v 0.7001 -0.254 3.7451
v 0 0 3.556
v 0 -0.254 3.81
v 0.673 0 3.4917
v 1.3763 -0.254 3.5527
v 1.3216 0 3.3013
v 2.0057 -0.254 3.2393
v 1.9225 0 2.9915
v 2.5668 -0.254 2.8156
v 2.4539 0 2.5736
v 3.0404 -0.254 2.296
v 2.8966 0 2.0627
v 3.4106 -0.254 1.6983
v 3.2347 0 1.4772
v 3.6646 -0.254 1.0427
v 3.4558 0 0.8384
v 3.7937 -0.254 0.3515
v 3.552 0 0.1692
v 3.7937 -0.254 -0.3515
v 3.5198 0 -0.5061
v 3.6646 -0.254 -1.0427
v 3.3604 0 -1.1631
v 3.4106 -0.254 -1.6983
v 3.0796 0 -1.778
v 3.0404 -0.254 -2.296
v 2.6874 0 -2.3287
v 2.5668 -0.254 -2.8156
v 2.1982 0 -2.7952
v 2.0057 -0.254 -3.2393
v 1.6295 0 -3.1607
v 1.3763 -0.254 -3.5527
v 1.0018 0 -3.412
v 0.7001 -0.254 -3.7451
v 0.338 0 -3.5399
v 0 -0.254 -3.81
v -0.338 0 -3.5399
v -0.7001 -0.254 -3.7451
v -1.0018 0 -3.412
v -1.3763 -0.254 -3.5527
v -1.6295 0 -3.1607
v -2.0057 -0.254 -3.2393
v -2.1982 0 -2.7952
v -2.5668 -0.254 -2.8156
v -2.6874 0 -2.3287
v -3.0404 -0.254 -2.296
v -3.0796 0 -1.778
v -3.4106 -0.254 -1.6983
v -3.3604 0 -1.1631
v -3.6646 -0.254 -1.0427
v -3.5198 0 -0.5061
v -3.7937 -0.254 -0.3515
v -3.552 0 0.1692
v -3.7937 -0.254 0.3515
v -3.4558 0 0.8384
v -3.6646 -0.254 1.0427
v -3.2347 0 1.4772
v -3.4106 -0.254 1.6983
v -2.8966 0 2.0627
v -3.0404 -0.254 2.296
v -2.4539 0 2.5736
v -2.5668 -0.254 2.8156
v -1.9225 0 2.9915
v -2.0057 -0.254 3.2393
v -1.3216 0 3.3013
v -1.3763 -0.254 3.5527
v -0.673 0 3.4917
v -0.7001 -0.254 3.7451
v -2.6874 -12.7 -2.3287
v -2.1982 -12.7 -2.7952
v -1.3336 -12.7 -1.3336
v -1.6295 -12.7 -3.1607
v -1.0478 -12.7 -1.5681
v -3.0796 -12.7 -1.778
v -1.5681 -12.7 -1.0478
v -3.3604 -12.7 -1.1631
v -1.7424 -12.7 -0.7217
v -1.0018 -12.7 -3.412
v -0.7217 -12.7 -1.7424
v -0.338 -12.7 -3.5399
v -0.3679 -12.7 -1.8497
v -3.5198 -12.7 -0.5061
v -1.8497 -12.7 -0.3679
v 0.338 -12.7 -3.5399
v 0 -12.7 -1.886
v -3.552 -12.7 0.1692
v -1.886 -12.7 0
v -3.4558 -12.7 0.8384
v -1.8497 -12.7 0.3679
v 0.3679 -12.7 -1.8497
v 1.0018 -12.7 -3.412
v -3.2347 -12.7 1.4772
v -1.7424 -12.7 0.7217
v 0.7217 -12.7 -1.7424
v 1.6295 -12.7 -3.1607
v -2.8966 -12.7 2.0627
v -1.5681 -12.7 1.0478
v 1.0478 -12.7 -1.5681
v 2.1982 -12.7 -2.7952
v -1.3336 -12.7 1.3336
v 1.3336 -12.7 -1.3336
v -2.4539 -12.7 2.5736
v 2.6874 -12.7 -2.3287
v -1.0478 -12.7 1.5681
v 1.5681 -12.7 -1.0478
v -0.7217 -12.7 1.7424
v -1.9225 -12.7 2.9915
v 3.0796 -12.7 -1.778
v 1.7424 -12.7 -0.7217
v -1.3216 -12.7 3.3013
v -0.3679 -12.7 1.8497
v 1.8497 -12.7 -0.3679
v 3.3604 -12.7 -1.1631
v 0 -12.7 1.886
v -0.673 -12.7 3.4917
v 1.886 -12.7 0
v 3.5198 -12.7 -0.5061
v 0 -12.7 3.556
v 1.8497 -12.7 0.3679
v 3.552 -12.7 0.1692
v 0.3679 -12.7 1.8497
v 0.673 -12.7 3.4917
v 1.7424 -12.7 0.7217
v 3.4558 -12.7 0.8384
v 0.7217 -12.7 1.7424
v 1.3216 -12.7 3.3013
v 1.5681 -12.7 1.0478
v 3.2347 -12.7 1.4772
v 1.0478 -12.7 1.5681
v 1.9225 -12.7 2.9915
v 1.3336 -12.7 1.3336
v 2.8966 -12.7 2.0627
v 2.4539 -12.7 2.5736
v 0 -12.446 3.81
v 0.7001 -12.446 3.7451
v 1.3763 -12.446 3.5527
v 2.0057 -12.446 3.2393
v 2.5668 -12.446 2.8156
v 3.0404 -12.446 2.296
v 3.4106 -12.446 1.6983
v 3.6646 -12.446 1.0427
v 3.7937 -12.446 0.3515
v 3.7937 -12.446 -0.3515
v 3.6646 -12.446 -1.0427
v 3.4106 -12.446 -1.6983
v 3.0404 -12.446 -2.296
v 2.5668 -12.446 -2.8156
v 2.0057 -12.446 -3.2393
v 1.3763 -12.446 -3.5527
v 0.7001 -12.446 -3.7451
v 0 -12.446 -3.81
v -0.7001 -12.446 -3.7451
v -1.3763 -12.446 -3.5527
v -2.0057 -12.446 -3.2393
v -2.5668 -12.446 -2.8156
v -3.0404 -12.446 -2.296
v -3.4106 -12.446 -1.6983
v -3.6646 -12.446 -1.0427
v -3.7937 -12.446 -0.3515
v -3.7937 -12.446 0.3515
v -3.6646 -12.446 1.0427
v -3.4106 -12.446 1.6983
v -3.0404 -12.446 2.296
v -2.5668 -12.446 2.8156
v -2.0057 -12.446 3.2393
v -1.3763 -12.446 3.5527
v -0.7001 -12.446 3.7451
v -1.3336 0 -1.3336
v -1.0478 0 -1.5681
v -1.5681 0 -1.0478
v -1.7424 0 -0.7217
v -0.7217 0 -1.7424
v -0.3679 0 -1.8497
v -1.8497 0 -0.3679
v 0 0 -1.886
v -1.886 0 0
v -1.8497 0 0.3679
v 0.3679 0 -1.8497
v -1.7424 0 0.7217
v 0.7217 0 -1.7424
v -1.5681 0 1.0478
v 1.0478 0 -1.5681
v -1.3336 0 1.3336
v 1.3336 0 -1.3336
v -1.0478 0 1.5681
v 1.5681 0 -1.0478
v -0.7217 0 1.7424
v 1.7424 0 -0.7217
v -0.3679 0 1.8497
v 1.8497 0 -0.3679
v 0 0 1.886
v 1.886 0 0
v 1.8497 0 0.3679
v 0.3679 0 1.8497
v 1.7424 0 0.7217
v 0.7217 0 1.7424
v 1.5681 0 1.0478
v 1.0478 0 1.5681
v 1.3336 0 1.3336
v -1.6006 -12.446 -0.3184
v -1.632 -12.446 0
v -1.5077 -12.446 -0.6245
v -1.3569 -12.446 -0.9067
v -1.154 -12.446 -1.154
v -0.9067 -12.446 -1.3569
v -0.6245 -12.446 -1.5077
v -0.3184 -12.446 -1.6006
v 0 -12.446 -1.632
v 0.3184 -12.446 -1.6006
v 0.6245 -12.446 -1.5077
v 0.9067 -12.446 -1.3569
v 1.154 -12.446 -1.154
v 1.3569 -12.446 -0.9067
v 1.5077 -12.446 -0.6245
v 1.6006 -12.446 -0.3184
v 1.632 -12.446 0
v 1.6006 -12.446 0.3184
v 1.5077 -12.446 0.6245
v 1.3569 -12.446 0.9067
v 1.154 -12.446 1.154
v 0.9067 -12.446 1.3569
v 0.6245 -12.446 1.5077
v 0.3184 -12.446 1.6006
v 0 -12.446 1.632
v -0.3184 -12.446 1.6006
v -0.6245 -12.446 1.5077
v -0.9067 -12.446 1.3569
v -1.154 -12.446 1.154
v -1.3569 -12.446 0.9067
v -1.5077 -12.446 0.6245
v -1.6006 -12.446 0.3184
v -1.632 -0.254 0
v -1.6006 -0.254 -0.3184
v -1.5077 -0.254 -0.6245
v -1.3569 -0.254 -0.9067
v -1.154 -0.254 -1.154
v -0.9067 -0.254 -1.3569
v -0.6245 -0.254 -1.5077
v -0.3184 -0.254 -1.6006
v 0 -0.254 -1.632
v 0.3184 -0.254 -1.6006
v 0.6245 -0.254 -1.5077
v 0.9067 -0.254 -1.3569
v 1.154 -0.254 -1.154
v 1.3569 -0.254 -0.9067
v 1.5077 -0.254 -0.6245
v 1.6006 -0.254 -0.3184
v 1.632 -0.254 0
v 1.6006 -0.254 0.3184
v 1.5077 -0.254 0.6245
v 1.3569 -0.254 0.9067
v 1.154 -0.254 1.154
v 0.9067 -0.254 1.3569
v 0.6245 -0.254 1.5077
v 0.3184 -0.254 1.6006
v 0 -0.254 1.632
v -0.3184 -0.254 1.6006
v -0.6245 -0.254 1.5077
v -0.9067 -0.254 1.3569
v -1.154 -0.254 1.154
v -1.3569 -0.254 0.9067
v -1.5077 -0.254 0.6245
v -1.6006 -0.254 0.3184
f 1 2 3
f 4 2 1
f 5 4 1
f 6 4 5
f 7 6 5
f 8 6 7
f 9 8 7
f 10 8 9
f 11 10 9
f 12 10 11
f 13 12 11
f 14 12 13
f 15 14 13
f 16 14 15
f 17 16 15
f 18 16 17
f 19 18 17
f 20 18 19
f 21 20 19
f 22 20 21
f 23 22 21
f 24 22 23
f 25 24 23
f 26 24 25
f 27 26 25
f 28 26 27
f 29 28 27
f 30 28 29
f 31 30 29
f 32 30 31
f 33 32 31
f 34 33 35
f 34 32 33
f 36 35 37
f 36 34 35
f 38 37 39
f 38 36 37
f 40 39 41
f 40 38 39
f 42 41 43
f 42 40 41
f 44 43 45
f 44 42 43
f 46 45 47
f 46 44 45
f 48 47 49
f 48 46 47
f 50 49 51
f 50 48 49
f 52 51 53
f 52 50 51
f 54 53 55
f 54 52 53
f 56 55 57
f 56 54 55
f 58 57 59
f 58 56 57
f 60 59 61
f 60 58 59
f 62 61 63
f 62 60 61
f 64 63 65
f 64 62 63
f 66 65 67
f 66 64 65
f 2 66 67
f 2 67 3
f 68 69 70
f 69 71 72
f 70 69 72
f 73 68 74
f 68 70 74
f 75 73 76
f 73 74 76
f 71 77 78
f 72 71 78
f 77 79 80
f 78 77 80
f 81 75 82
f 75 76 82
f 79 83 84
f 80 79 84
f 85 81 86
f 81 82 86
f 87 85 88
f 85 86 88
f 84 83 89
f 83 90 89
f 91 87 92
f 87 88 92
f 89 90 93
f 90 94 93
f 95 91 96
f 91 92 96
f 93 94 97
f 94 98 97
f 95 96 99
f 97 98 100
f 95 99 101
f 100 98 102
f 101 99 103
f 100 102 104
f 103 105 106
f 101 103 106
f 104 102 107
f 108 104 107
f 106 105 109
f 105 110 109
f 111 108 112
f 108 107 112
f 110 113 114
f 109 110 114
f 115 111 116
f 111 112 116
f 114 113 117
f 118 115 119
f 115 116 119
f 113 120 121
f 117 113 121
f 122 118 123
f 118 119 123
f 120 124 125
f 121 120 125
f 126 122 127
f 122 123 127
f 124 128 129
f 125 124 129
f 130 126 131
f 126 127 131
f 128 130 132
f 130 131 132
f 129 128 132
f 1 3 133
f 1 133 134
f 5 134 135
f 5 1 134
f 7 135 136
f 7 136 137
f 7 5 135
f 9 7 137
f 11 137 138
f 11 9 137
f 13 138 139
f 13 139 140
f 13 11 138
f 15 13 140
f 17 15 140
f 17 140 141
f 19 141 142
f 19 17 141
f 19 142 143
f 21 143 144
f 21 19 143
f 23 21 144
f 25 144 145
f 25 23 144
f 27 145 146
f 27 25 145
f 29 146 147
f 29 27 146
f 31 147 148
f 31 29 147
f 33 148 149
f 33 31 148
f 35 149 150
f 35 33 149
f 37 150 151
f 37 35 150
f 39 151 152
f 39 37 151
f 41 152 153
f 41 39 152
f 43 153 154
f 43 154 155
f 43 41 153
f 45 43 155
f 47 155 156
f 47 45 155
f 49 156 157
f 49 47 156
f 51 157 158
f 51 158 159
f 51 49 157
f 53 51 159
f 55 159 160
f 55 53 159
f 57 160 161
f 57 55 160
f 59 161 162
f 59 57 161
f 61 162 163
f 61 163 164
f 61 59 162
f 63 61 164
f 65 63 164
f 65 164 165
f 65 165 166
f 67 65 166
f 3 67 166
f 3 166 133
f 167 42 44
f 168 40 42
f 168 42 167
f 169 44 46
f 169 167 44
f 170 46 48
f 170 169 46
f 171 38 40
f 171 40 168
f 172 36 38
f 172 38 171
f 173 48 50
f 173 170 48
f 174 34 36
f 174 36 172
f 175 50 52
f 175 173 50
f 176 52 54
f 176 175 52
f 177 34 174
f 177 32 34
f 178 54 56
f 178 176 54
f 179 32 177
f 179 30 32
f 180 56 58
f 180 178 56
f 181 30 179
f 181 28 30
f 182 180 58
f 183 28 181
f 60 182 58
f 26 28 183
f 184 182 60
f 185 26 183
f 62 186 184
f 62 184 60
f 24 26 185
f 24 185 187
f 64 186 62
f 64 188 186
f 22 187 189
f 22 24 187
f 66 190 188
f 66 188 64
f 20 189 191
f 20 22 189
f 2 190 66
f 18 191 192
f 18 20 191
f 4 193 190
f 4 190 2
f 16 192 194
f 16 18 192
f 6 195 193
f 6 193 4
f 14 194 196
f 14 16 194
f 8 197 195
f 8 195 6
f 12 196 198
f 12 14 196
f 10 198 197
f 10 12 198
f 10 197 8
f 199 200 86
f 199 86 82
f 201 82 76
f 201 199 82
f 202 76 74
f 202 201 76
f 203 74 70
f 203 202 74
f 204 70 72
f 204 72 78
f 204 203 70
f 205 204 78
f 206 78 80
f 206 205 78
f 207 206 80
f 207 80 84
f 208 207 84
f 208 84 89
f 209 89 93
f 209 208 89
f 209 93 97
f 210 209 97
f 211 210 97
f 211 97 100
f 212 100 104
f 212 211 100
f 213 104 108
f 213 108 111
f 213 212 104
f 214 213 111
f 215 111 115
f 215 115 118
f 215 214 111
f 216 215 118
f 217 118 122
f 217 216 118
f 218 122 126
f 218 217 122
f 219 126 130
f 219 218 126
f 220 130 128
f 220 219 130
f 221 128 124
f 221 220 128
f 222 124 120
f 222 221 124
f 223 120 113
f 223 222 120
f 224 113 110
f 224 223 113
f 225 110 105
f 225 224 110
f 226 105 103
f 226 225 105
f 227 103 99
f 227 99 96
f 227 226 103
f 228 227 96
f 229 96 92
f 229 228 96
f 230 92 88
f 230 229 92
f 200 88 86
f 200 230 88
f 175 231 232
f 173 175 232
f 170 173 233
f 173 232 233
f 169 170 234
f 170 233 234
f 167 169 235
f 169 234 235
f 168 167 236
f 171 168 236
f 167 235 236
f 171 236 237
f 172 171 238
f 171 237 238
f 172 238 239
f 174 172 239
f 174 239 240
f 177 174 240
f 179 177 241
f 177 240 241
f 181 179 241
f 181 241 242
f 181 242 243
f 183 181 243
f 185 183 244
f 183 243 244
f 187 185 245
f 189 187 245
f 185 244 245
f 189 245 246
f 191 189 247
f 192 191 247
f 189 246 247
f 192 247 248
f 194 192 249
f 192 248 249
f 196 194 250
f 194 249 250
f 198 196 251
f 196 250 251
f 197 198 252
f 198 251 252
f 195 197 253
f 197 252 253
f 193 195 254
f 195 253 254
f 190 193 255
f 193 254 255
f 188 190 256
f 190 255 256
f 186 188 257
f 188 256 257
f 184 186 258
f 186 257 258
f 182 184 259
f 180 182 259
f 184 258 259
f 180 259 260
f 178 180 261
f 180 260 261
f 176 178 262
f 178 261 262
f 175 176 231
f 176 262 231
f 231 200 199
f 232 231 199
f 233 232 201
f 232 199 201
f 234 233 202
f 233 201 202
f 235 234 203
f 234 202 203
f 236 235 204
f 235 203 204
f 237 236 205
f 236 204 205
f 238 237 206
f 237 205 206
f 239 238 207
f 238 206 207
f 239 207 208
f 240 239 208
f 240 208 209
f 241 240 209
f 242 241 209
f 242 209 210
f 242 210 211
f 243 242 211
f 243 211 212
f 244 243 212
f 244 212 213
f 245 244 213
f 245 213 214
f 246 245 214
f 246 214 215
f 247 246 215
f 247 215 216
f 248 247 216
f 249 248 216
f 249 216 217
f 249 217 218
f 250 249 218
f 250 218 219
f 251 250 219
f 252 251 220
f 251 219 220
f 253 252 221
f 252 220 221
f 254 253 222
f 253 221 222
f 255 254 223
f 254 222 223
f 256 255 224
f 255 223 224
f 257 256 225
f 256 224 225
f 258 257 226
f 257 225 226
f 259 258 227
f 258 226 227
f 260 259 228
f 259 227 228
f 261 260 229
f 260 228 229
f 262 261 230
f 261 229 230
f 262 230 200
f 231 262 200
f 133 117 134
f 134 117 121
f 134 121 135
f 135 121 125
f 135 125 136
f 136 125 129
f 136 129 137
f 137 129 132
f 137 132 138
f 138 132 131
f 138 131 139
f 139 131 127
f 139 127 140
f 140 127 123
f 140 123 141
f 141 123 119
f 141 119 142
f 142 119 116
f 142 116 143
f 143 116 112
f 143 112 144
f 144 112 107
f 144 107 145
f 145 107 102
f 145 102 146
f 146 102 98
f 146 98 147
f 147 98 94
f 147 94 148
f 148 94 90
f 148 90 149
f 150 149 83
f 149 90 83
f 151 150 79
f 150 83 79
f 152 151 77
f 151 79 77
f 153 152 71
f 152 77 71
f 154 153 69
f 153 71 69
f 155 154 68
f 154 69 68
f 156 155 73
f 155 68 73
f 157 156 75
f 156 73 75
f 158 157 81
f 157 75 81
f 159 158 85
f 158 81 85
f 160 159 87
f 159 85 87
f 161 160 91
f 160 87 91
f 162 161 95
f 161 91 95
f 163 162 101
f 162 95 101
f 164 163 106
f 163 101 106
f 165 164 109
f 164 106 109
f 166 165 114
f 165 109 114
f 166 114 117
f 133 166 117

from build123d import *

# Parameters (mm, degrees)
SKETCH1_R                    = 3.81
BOSS_EXTRUDE1_DEPTH          = 12.7
F_30_0_1285_DIAMETER_HOLE1_D = 3.2639
CHAMFER1_SIZE                = 0.254


with BuildPart() as part:
    # Sketch1 → Boss-Extrude1 (new body)
    with BuildSketch(Plane(origin=(0, 0, 0), x_dir=(1, 0, 0), z_dir=(0, 1, 0))):
        with Locations(Location((0, 0, 0), (0, 0, 270))):
            Circle(SKETCH1_R)
    extrude(amount=-BOSS_EXTRUDE1_DEPTH)

    # #30 (0.1285) Diameter Hole1 (through all)
    with Locations(Plane(origin=(0, 0, 0), x_dir=(1, 0, 0), z_dir=(0, 1, 0))):
        with Locations((0, 0)):
            Hole(F_30_0_1285_DIAMETER_HOLE1_D / 2)

    # Chamfer1
    chamfer1_edges = [part.edges().sort_by_distance(p)[0] for p in [
        (0, 0, -3.81),
        (0, -12.7, -3.81),
        (1.63195, 0, 0),
        (1.63195, -12.7, 0),
    ]]
    chamfer(chamfer1_edges, length=CHAMFER1_SIZE)


solid = part.part
